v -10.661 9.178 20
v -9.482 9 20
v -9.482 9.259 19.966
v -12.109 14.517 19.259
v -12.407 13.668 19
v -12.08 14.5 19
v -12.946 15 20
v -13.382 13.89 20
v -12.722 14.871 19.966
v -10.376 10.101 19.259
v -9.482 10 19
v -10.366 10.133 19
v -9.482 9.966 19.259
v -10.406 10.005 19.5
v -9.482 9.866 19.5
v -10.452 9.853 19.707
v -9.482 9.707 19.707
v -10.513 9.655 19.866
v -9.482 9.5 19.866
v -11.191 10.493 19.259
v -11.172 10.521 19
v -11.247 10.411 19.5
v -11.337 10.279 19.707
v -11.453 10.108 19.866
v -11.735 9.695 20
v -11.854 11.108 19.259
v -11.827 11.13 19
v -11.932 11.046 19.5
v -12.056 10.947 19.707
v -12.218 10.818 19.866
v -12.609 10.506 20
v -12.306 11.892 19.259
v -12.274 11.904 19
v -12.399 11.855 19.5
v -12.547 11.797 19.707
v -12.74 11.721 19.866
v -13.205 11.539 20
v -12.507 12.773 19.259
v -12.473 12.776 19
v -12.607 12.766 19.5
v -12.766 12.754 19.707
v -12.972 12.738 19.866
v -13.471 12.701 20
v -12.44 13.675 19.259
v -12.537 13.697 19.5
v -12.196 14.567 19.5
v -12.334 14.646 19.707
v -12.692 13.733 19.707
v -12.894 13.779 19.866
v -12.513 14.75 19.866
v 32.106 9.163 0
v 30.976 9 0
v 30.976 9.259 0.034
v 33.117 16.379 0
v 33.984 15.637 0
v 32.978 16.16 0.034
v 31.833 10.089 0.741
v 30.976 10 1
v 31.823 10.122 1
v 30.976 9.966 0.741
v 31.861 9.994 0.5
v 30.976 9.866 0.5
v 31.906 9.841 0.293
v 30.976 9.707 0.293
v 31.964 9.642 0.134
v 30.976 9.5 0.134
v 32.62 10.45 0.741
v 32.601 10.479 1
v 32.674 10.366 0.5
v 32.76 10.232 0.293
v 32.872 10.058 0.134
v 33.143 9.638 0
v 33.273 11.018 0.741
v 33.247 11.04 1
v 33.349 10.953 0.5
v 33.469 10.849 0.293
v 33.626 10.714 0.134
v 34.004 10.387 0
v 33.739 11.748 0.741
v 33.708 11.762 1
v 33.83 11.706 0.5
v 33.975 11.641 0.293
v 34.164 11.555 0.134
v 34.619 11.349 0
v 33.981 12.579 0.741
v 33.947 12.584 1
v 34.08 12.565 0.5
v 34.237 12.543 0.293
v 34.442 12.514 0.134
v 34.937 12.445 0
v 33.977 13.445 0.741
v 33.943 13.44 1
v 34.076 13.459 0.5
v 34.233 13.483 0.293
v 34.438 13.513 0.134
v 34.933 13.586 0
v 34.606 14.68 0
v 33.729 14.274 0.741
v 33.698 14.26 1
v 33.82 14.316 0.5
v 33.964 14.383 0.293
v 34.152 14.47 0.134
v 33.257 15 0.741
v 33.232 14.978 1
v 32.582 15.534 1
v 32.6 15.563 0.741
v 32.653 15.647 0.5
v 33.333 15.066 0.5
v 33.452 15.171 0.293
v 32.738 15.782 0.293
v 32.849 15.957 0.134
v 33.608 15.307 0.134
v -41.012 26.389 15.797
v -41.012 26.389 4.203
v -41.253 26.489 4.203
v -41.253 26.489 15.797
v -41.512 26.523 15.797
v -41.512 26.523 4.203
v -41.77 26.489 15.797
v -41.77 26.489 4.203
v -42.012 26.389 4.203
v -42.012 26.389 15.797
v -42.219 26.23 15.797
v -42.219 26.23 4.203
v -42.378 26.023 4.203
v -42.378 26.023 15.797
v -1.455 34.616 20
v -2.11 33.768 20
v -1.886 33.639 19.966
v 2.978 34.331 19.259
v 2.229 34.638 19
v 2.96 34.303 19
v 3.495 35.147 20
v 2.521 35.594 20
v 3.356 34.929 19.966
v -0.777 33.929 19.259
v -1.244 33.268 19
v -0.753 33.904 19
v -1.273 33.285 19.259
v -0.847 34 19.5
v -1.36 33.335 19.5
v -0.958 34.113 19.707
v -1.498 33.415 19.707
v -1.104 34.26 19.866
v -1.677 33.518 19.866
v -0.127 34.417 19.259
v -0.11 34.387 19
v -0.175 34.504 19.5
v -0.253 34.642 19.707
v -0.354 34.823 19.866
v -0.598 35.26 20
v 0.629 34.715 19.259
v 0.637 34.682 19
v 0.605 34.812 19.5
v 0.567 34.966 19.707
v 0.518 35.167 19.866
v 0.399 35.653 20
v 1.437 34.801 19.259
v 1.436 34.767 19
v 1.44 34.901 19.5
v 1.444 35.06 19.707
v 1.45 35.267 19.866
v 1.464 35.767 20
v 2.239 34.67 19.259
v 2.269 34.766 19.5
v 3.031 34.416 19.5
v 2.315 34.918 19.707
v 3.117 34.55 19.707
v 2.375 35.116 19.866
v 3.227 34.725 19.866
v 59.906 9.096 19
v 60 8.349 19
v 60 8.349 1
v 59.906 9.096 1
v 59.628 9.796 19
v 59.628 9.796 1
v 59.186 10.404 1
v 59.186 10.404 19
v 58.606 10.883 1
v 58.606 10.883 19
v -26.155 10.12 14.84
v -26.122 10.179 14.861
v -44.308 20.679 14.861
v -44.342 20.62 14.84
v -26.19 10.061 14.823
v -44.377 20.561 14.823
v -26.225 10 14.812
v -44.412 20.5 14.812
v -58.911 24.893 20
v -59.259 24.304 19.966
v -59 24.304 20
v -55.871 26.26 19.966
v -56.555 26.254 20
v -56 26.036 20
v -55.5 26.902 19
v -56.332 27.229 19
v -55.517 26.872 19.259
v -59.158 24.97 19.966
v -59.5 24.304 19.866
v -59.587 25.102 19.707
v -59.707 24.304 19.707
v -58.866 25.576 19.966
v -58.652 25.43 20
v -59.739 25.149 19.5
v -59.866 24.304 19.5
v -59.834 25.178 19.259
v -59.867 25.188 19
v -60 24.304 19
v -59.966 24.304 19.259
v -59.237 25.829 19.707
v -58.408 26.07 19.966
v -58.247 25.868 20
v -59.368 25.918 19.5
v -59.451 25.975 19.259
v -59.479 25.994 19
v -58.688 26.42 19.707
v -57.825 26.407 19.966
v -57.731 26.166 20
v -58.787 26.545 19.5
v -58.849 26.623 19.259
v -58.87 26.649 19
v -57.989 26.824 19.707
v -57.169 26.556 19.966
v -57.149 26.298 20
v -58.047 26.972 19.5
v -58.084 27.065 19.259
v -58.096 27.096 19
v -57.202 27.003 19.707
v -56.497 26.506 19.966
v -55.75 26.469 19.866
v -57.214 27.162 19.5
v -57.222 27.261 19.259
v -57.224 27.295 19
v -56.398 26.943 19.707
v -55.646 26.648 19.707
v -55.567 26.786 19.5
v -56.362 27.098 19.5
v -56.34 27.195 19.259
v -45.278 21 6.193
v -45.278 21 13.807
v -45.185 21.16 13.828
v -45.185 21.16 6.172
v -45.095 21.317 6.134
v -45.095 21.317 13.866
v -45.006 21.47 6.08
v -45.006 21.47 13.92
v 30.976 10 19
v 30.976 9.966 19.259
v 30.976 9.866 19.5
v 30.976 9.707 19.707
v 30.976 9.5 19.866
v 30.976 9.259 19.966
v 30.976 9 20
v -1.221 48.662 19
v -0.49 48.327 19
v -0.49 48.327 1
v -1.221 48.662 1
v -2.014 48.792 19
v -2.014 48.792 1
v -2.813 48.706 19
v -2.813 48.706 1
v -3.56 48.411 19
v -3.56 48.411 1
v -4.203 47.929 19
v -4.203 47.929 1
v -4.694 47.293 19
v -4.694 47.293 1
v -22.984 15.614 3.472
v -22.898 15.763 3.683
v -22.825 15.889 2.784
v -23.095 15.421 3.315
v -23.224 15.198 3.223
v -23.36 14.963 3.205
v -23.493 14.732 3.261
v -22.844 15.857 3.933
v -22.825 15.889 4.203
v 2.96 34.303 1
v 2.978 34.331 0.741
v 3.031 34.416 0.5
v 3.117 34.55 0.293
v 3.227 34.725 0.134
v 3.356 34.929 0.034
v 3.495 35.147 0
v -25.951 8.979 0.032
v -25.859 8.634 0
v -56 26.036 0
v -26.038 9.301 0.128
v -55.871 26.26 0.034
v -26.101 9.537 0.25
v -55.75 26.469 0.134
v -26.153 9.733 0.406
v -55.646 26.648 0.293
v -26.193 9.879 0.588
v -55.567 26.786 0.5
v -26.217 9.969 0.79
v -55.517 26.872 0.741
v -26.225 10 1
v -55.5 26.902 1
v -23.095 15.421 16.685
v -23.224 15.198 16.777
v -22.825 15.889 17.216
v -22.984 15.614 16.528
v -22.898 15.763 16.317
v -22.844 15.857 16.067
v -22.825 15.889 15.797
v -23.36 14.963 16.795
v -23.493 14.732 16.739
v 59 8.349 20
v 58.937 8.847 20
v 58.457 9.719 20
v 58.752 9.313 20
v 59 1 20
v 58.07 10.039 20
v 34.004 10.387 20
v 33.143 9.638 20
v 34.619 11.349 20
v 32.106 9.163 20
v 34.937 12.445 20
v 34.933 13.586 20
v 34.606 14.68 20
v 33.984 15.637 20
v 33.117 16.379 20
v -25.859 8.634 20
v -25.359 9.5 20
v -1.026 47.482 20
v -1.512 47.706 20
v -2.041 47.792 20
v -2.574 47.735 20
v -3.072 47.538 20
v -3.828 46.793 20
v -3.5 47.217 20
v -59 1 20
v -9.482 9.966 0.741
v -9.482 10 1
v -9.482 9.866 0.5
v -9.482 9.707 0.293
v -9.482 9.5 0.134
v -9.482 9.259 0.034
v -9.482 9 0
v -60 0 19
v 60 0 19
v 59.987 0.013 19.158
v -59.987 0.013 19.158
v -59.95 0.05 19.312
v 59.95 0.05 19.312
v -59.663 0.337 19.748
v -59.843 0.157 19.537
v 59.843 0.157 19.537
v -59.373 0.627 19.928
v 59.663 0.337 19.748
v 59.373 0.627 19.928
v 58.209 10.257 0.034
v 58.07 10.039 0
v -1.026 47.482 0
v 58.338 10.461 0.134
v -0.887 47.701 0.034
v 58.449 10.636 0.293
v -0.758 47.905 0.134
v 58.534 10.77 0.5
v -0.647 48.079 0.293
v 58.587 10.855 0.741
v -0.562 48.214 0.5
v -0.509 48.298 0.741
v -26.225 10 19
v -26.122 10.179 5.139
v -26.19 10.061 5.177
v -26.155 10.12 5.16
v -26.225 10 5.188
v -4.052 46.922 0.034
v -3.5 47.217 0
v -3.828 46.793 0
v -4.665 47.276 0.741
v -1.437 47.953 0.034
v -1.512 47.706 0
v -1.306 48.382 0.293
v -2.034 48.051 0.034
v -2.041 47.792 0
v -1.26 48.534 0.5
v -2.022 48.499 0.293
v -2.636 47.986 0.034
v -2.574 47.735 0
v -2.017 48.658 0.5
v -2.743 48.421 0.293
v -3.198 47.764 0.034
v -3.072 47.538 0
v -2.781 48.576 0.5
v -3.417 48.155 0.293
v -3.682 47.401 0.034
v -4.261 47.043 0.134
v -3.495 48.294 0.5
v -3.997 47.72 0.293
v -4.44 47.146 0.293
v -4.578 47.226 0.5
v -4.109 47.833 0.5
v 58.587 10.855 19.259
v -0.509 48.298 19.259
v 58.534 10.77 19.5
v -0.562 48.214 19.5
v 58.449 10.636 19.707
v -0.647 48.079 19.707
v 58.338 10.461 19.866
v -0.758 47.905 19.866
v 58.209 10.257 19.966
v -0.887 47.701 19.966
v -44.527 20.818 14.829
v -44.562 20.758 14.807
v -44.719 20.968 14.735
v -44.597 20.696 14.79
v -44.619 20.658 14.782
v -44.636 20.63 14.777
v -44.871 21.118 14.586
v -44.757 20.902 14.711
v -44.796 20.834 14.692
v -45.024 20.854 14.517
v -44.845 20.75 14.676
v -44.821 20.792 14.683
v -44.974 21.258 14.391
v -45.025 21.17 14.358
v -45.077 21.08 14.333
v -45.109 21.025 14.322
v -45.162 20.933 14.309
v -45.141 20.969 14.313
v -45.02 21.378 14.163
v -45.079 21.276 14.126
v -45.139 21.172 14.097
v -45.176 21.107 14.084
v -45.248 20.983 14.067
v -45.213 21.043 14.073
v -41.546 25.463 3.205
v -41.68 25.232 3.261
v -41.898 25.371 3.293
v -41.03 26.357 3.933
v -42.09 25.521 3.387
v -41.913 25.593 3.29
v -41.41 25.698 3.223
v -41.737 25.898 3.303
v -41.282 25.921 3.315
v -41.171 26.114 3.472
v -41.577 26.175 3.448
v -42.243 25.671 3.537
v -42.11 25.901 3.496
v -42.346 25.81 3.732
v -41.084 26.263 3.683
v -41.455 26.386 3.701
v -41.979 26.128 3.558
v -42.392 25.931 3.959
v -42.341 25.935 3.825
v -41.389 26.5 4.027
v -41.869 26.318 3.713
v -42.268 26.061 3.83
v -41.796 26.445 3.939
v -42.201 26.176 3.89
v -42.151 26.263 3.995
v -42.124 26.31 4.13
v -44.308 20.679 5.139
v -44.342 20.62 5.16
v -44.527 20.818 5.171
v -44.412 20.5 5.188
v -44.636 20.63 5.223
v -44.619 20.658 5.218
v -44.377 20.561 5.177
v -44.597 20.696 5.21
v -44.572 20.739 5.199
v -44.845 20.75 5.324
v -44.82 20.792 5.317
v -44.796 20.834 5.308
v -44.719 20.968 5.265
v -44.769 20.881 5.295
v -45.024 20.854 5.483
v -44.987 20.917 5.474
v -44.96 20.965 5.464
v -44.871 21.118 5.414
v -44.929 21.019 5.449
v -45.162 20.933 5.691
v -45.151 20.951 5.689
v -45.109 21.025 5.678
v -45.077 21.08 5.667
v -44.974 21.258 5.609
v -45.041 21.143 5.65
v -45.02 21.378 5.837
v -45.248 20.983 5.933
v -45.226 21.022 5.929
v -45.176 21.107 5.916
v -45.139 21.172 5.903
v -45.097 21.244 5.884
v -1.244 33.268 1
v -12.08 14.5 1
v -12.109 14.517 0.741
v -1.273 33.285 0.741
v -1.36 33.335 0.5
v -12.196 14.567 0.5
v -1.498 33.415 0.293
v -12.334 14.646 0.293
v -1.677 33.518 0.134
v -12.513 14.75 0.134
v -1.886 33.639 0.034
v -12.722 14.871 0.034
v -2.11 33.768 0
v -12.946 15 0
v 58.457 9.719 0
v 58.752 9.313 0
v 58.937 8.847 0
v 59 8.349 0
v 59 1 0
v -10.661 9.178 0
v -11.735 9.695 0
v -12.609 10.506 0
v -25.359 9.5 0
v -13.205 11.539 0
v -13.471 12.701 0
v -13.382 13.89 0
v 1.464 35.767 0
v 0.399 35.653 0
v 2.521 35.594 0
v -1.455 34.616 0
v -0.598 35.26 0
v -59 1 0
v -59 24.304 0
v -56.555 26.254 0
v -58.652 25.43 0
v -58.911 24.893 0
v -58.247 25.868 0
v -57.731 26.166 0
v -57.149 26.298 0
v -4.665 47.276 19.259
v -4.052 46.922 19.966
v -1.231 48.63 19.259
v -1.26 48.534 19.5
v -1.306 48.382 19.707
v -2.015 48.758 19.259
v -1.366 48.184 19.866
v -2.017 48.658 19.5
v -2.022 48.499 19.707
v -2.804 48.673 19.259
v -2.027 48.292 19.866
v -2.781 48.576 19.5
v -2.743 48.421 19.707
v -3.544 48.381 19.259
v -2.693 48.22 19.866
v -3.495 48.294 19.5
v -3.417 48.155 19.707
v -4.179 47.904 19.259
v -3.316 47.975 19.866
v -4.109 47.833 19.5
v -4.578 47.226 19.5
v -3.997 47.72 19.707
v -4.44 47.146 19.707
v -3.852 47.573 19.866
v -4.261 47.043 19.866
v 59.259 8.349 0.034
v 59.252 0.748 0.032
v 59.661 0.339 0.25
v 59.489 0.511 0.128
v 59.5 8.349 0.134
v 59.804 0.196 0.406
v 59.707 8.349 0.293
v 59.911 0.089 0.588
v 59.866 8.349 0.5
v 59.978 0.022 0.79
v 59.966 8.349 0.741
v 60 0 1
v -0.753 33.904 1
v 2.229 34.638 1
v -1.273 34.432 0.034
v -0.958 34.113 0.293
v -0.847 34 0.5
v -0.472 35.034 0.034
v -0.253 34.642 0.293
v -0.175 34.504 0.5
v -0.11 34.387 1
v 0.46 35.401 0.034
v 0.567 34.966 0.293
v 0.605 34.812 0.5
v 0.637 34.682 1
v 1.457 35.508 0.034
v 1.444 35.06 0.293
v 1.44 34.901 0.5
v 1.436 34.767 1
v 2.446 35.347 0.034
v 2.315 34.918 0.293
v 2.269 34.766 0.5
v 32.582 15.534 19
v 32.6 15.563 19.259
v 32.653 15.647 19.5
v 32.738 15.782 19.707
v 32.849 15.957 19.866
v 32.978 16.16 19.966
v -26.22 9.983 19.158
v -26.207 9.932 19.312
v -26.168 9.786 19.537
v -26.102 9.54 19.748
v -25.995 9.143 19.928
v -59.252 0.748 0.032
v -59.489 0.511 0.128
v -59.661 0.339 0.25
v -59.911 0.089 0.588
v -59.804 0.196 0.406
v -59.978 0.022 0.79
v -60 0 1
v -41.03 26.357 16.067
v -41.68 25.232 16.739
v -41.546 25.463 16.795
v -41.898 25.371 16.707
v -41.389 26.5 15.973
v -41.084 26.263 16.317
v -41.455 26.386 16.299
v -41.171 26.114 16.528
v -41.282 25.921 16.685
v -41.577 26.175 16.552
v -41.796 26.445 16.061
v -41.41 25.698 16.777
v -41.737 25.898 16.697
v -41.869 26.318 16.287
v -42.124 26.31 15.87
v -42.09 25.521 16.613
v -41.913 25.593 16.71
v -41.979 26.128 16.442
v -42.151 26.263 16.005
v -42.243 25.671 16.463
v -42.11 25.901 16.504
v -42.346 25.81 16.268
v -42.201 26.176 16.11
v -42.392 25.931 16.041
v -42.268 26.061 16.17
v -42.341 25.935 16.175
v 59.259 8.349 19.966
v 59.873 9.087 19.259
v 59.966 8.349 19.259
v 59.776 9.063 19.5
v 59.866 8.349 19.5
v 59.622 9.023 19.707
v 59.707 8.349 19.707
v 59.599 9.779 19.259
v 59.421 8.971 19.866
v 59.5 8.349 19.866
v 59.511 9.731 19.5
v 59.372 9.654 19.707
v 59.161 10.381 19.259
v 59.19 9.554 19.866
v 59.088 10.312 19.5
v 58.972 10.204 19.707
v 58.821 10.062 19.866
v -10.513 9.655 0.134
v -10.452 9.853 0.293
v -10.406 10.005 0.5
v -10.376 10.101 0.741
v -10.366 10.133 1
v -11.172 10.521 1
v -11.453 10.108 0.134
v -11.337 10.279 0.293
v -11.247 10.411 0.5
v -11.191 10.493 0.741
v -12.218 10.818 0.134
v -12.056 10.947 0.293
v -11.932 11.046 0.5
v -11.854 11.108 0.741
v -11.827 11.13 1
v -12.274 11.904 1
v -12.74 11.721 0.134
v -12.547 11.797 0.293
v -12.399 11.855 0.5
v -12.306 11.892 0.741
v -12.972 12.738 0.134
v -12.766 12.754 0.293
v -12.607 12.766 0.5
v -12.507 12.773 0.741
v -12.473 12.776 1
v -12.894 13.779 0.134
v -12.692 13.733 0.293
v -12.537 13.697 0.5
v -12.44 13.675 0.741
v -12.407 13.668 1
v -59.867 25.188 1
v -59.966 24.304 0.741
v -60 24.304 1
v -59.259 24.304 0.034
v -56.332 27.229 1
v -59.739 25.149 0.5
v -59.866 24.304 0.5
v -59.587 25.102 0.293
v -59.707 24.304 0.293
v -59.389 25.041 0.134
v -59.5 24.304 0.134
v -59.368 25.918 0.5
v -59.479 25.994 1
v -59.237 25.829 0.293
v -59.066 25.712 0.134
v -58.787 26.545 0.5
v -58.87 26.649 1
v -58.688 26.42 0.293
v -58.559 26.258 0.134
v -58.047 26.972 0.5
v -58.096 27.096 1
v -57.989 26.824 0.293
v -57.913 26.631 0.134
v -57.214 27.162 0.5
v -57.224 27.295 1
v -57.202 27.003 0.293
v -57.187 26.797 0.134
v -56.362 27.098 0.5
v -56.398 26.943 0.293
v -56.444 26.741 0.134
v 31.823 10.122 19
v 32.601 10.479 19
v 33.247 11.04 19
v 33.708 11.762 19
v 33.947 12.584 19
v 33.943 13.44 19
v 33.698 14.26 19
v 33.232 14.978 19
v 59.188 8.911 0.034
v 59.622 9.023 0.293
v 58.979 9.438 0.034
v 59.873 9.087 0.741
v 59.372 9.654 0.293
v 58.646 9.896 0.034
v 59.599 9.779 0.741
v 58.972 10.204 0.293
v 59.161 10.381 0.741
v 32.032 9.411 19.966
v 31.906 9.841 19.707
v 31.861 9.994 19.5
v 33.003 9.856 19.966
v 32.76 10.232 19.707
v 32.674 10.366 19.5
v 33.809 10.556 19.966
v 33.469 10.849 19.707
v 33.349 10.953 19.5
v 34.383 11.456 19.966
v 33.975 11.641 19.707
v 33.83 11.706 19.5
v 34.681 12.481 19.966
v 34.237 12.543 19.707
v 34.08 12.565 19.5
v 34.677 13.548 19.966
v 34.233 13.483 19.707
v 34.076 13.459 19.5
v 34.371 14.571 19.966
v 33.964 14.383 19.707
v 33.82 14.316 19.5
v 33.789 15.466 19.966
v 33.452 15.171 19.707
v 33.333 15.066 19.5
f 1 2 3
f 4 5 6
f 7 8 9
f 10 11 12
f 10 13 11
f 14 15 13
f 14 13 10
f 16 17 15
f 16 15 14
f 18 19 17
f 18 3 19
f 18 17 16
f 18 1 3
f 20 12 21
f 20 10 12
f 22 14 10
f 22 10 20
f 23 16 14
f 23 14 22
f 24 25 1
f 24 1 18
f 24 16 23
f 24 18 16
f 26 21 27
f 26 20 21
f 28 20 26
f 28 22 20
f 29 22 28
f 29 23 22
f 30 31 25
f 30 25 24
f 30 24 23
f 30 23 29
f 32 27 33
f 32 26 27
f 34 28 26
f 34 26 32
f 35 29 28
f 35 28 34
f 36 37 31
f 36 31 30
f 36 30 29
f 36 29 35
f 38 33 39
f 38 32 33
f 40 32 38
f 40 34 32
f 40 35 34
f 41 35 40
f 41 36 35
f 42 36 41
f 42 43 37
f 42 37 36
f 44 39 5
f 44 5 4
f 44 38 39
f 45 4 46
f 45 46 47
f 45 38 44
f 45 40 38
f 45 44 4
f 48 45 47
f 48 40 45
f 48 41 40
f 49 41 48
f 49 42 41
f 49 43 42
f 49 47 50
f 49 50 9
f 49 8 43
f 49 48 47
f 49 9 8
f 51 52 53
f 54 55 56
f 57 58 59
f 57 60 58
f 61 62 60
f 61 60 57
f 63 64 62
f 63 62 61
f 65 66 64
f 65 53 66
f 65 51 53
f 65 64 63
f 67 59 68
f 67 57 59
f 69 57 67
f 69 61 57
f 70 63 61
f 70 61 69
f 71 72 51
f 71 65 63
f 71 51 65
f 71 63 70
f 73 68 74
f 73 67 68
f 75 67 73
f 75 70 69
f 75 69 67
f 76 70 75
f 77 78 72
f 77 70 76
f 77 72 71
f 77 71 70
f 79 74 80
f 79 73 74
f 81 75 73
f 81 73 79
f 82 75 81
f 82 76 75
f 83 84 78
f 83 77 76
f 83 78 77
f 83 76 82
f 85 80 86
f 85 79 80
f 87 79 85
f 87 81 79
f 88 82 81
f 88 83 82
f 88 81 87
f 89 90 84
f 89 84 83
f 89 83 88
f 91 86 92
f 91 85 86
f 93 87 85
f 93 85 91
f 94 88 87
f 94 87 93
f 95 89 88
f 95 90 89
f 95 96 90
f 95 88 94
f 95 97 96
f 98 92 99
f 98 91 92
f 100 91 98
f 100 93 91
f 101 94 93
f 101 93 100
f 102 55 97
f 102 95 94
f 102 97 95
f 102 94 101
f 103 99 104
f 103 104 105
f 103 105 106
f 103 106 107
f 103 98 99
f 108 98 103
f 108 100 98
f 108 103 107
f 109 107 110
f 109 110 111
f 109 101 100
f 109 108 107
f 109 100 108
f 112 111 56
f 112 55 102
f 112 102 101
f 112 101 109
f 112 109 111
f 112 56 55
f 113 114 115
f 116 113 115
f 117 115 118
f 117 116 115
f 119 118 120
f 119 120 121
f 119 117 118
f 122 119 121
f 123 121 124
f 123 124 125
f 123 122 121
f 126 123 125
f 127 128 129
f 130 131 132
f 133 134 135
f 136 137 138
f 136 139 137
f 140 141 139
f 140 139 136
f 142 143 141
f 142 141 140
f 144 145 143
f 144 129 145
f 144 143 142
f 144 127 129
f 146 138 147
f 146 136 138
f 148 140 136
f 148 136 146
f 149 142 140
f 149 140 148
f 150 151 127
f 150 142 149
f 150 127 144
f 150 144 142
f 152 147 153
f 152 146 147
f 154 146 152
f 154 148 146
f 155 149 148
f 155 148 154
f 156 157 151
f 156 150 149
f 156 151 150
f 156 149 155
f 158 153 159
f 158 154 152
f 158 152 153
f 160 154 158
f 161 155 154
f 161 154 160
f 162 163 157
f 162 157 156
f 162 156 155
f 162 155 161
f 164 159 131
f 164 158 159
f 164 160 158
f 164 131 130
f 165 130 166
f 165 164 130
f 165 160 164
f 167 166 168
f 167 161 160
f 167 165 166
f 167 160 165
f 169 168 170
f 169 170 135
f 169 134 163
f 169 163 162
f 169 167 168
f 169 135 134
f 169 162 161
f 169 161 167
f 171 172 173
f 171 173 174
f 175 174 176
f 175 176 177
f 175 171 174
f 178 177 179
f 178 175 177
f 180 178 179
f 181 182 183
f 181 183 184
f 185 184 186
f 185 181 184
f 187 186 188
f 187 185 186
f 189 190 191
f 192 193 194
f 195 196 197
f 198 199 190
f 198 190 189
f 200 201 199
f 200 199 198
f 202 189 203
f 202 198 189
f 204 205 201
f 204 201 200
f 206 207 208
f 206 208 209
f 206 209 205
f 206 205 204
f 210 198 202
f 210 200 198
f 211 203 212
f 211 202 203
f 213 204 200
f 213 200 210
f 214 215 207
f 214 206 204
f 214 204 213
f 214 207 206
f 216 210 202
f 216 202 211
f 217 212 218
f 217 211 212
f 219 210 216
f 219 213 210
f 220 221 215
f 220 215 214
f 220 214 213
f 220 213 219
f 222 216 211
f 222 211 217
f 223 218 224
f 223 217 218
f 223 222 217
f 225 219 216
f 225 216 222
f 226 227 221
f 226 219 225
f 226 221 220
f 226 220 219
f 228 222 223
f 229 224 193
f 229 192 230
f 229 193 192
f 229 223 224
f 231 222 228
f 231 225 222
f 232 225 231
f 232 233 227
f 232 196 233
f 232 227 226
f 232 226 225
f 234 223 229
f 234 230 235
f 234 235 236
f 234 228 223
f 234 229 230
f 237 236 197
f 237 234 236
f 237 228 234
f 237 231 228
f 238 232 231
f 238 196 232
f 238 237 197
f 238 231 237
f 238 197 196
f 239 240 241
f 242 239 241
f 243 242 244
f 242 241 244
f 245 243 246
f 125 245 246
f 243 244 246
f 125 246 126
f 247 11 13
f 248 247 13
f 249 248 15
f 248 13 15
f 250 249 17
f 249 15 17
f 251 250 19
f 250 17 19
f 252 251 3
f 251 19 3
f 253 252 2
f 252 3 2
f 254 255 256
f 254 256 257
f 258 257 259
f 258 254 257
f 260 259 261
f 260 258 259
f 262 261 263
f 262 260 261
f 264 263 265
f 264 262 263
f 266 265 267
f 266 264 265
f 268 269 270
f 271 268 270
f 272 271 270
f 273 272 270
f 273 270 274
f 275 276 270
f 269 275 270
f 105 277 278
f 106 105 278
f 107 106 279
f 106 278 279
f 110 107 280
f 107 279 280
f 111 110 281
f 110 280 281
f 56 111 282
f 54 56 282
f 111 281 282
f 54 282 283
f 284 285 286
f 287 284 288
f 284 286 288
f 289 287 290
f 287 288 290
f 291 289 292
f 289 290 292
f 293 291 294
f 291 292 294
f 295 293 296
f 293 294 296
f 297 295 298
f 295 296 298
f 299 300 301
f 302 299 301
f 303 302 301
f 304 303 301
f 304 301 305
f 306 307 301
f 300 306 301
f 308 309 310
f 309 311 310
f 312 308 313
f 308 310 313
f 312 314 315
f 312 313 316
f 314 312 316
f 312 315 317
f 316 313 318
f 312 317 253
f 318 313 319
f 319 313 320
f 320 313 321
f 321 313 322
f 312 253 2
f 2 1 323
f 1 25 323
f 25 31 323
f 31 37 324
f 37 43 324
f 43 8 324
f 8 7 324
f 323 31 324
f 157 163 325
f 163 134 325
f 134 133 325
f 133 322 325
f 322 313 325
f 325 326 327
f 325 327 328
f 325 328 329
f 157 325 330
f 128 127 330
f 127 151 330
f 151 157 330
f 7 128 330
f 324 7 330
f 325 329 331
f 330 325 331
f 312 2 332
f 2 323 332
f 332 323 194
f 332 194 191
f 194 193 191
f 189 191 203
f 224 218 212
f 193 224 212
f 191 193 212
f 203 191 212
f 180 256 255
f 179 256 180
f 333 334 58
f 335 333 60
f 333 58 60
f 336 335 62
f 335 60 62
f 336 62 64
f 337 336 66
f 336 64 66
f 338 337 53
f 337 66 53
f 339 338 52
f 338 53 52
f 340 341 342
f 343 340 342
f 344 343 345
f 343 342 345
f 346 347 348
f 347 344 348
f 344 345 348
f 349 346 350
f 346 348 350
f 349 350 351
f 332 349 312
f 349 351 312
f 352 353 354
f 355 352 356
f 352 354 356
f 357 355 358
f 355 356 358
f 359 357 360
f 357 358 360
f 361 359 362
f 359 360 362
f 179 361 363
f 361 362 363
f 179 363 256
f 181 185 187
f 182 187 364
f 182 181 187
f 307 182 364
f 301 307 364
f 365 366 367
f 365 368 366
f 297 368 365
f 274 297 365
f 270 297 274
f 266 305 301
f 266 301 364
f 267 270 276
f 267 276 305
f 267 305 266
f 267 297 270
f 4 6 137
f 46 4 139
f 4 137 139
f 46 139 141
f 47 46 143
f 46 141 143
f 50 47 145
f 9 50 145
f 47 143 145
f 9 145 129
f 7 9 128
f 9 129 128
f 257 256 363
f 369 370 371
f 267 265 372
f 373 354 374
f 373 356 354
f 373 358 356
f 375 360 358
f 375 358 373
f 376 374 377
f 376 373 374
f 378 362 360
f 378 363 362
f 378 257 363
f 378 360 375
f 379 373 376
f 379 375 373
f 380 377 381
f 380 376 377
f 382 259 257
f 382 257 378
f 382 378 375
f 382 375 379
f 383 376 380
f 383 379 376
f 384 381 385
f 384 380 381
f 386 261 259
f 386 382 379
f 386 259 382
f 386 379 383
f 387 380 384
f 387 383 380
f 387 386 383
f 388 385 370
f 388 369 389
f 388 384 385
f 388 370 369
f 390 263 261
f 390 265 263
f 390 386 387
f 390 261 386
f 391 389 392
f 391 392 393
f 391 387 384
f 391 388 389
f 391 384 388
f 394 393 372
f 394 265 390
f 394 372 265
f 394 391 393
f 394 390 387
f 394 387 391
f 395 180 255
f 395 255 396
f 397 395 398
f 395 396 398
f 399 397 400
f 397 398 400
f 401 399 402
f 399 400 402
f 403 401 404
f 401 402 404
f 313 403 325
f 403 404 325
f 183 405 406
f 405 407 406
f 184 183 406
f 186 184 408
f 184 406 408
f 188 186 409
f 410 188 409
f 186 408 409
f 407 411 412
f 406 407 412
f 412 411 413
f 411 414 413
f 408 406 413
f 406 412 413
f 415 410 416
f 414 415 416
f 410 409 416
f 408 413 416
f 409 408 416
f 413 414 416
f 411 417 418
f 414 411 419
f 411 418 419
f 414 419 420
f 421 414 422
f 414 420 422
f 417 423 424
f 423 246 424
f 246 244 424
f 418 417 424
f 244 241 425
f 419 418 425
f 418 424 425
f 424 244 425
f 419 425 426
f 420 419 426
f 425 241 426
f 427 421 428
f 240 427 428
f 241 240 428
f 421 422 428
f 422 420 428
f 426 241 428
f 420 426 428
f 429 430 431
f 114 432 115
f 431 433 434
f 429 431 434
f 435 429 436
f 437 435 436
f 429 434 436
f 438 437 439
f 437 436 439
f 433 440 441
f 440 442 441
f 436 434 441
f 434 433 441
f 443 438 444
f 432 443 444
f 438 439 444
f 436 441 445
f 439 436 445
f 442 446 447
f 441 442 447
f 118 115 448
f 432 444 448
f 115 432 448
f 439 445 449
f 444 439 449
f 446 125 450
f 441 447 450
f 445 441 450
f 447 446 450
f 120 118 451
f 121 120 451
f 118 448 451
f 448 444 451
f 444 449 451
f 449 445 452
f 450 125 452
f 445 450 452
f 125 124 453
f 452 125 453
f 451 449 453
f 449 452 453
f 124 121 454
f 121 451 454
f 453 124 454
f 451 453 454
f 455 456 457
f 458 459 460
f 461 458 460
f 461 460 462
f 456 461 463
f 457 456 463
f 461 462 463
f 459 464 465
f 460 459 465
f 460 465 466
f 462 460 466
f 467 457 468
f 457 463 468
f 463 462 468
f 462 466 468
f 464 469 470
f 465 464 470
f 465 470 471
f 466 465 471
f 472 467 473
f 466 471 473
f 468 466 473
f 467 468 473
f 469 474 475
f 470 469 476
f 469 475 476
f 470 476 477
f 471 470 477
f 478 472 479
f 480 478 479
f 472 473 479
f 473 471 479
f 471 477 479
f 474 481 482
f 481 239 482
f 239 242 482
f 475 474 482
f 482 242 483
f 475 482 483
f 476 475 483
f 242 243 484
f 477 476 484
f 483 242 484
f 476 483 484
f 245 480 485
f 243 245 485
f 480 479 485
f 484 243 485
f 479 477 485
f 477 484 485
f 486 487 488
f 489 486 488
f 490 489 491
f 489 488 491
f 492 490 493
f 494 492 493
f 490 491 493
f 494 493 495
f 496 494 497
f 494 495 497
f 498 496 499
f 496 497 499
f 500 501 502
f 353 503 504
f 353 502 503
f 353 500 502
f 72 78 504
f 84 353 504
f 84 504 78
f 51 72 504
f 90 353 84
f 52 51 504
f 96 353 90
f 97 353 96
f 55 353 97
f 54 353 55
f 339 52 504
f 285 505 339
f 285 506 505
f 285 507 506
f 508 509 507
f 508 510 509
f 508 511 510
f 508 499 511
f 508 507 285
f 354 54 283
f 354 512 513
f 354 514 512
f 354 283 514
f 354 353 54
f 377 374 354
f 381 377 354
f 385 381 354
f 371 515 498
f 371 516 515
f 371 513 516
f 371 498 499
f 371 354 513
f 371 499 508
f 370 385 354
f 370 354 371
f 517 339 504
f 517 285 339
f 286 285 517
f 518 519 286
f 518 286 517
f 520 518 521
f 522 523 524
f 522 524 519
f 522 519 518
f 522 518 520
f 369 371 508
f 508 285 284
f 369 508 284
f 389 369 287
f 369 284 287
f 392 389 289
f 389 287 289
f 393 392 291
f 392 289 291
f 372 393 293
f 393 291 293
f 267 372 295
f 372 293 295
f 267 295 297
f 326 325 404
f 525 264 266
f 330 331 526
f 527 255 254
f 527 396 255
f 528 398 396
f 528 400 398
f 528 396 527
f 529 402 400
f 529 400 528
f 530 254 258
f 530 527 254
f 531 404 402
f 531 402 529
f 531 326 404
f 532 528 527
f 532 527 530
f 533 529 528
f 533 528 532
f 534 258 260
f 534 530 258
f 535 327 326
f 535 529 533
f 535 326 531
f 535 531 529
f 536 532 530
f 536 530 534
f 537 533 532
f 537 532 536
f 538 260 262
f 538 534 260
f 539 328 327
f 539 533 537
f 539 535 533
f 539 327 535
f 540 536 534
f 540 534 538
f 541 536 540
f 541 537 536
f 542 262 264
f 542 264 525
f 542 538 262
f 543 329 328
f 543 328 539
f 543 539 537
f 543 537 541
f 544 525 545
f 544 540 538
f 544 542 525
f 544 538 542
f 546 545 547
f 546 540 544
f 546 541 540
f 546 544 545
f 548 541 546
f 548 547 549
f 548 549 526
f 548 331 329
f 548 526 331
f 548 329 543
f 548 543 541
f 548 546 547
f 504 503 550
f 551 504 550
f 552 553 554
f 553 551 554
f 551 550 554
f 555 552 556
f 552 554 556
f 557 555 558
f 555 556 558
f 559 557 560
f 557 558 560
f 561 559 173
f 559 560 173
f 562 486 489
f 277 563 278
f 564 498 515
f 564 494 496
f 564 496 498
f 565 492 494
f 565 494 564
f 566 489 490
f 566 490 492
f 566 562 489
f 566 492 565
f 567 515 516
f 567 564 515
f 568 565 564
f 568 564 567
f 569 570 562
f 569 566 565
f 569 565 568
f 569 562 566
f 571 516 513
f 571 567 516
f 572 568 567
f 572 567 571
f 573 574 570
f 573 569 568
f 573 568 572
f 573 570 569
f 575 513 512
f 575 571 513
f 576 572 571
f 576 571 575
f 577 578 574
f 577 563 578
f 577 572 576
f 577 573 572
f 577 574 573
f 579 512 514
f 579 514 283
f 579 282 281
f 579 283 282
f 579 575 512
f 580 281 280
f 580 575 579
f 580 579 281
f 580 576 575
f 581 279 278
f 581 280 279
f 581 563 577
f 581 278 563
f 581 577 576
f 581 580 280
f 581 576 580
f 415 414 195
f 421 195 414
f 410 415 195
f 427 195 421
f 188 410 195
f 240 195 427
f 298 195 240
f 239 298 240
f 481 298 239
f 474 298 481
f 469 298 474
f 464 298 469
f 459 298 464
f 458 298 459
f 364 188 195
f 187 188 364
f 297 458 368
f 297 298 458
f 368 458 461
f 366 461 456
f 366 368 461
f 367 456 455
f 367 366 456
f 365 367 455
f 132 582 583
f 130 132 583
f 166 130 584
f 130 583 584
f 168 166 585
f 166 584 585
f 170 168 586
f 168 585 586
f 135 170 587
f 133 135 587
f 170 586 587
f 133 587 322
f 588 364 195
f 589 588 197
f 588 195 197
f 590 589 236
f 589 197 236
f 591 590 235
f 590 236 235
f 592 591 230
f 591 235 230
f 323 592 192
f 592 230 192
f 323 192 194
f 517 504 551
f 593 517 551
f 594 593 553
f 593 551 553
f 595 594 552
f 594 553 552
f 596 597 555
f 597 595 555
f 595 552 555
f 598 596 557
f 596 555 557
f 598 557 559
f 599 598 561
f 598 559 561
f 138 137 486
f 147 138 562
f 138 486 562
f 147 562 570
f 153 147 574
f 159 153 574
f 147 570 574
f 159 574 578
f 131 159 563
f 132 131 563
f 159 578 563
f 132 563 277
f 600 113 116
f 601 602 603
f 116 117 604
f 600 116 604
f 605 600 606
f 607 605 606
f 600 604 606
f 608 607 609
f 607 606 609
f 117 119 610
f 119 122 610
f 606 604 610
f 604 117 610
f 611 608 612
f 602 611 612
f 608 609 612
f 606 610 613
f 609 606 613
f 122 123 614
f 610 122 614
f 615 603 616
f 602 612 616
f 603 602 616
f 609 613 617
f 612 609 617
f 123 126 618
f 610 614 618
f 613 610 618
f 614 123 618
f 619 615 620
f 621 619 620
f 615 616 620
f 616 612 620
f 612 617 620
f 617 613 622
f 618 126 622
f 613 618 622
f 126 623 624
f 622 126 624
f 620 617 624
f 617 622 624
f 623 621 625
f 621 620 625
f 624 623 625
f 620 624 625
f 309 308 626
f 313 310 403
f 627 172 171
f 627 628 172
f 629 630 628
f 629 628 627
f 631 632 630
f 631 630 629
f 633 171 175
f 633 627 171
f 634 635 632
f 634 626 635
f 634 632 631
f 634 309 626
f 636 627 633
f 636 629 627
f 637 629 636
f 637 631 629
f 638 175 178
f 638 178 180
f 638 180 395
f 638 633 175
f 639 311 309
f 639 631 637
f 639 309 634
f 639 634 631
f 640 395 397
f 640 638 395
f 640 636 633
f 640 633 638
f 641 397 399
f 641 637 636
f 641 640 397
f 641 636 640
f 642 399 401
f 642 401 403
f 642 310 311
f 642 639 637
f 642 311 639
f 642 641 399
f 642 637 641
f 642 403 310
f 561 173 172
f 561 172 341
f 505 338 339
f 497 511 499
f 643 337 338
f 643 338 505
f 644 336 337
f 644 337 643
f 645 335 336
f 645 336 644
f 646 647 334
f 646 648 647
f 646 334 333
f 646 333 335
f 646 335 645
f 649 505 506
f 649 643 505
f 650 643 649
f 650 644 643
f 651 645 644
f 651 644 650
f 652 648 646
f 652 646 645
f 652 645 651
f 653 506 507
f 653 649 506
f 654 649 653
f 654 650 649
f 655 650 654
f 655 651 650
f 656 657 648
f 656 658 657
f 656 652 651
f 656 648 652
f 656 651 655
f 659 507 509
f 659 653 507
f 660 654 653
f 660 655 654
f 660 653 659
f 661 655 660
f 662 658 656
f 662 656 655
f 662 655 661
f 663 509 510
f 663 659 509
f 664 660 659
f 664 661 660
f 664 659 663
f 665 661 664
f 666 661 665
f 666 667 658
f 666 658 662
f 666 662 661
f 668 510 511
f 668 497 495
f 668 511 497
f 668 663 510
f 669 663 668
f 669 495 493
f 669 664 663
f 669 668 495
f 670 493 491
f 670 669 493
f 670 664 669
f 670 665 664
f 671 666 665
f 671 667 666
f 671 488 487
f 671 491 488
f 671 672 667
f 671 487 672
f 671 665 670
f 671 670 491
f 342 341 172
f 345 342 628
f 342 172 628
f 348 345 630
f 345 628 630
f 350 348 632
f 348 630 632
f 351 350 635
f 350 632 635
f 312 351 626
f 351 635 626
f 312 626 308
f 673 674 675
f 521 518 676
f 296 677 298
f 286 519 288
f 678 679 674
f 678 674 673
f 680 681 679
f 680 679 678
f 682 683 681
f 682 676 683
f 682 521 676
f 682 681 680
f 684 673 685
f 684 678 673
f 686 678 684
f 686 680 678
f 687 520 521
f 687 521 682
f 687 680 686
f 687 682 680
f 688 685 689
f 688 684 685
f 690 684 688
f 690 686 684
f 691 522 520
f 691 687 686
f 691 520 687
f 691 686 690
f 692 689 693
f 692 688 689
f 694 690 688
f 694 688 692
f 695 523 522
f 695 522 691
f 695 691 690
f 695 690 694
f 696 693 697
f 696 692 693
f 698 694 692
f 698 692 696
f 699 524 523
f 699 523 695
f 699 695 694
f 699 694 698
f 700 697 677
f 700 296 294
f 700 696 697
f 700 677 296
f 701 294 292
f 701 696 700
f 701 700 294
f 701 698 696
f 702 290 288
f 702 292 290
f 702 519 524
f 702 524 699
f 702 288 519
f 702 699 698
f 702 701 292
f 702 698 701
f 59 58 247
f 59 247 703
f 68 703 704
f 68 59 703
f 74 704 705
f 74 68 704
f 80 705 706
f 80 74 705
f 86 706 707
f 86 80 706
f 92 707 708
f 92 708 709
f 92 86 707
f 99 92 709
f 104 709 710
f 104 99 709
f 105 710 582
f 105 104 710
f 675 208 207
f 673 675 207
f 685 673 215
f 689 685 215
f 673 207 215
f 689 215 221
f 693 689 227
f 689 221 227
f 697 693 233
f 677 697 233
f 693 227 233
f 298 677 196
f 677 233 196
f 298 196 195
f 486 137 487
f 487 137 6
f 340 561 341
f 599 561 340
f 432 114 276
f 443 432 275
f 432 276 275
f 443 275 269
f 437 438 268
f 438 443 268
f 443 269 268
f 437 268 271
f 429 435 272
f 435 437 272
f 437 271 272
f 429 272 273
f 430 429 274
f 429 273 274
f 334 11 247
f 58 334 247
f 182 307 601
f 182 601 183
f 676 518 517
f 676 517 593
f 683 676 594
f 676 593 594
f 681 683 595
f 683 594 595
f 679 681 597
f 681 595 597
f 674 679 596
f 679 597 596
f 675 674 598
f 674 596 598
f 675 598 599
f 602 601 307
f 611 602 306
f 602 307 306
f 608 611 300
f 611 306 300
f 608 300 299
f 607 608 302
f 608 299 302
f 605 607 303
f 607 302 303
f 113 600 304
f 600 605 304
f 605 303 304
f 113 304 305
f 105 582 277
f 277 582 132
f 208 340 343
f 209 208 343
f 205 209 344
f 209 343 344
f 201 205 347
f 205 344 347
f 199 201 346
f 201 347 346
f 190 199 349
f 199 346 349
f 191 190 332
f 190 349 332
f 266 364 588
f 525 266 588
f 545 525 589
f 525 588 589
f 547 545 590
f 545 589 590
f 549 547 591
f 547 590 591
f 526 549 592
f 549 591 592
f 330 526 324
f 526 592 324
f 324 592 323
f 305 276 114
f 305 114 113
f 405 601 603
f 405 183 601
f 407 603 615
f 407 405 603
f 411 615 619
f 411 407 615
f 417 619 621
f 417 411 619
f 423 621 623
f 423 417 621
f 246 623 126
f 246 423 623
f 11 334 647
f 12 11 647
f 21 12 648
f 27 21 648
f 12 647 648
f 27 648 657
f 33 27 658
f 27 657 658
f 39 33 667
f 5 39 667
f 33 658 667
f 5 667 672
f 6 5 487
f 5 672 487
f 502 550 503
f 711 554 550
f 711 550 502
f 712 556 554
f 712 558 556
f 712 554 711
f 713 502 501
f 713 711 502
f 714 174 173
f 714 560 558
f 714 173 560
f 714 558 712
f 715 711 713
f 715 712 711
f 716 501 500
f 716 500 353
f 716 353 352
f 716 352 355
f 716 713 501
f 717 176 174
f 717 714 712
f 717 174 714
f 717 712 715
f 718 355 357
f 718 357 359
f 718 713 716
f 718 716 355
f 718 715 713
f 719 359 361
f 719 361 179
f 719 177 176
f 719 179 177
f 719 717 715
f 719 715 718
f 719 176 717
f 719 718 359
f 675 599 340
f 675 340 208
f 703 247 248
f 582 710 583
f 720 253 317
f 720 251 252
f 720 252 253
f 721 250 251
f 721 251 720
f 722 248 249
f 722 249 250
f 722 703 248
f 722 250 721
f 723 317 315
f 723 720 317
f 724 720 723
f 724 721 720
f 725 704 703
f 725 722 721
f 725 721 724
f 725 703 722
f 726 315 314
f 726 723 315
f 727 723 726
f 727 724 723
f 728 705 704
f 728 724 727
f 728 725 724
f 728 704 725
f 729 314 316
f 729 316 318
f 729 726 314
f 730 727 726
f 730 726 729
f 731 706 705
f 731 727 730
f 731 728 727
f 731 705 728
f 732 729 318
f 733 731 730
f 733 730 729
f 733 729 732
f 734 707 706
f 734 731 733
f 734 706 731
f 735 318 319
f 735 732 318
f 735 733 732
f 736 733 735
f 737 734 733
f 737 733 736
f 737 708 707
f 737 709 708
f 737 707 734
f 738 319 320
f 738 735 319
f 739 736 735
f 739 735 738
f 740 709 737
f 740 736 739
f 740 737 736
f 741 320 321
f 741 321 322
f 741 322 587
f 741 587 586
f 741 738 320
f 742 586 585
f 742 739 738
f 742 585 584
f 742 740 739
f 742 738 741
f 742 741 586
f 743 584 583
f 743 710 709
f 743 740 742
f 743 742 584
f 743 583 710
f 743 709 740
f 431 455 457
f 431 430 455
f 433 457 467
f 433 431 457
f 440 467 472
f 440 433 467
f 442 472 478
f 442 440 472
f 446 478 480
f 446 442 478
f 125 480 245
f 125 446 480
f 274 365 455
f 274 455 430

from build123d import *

# Parameters (mm, degrees)
RESSALTO_EXTRUS_O1_DEPTH = 20
RESSALTO_EXTRUS_O2_DEPTH = 22
CORTE_EXTRUS_O1_DEPTH    = 81.622577483
FILETE1_R                = 3
FILETE2_R                = 1
FILETE4_R                = 1


with BuildPart() as part:
    # Esboço1 → Ressalto-extrusão1 (new body)
    with BuildSketch(Plane.XY):
        Polygon((60, 0), (-60, 0), (-60, 29.5), (-26.225009252, 10), (-3.130998485, 50), (60, 10), align=None)
    extrude(amount=RESSALTO_EXTRUS_O1_DEPTH)

    # Esboço2 → Ressalto-extrusão2 (add)
    with BuildSketch(Plane(origin=(-23.998883958, 13.855762114, 0), x_dir=(0, 0, 1), z_dir=(-0.8660254037844418, 0.49999999999999484, 0))):
        Polygon((5.188348382, -4.384983309), (2.783800982, 2.347749412), (17.216199018, 2.347749412), (14.811651618, -4.384983309), (14.811651618, -4.452250588), (5.188348382, -4.452250588), align=None)
    extrude(amount=RESSALTO_EXTRUS_O2_DEPTH)

    # Esboço3 → Corte-extrusão1 (cut, through all)
    with BuildSketch(Plane.XY.offset(20)):
        Polygon((-14.678003869, 10), (41.315910897, 10), (0.319084351, 35.975718762), align=None)
    extrude(amount=-CORTE_EXTRUS_O1_DEPTH, mode=Mode.SUBTRACT)

    # Filete1
    filete1_edges = [part.edges().sort_by_distance(p)[0] for p in [
        (-60, 29.5, 10),
        (-3.130998485, 50, 10),
        (60, 10, 10),
        (-14.678003869, 10, 10),
        (0.319084351, 35.975718762, 10),
        (41.315910897, 10, 10),
    ]]
    fillet(filete1_edges, radius=FILETE1_R)

    # Filete2
    # the kernel refuses this fillet: 1 mm, written as the material it adds along each edge
    with BuildSketch(Plane(origin=(-25.870593694, 9.873051646, 5.188348382), x_dir=(-0.4999999999999947, -0.8660254037844417, -8.936278675324251e-11), z_dir=(-0.8660254037844417, 0.4999999999999947, 0))) as filete2_piece_1:
        with BuildLine():
            CenterArc((0.196805258, -0.991574461), FILETE2_R, 97.442894705, 12.210929358)
            Line((-0.139531139, -0.04983255), (0, 0))
            Line((0, 0), (0.067267279, 0))
        make_face()
    extrude(amount=22.370407054)
    with BuildSketch(Plane(origin=(-25.870593694, 9.873051646, 14.811651618), x_dir=(-0.4999999999999947, -0.8660254037844417, 8.941560163903726e-11), z_dir=(-0.8660254037844417, 0.4999999999999947, 0))) as filete2_piece_2:
        with BuildLine():
            CenterArc((0.196805258, 0.991574461), FILETE2_R, 250.346175937, 12.210929358)
            Line((-0.139531139, 0.04983255), (0, 0))
            Line((0, 0), (0.067267279, 0))
        make_face()
    extrude(amount=22.370407054)
    # the kernel refuses this fillet: 1 mm, written as the material it takes off along each edge
    with BuildSketch(Plane(origin=(-26.225009252, 10, 20), x_dir=(0.8660254037844417, -0.49999999999999484, 0), z_dir=(0.49999999999999484, 0.8660254037844417, 0))) as filete2_2_piece_1:
        with BuildLine():
            CenterArc((FILETE2_R, FILETE2_R), FILETE2_R, 180, 90)
            Line((0, FILETE2_R), (0, 0))
            Line((0, 0), (FILETE2_R, 0))
        make_face()
    extrude(amount=43.061918814, mode=Mode.SUBTRACT)
    with BuildSketch(Plane(origin=(-2.095973634, 45.792715629, 20), x_dir=(0.5352147458149246, 0.8447160326774114, 0), z_dir=(0.8447160326774114, -0.5352147458149246, 0))) as filete2_2_piece_2:
        with BuildLine():
            CenterArc((3 - FILETE2_R, -FILETE2_R), FILETE2_R, 0, 90)
            Line((3, -FILETE2_R), (3, 0))
            Line((3, 0), (3 - FILETE2_R, 0))
        make_face()
    revolve(axis=Axis((-2.095973634, 45.792715629, 20), (0, 0, 1)), revolution_arc=92.358476116, mode=Mode.SUBTRACT)
    with BuildSketch(Plane(origin=(-0.490329397, 48.326863727, 20), x_dir=(-0.5352147458149248, -0.8447160326774114, 0), z_dir=(0.8447160326774115, -0.5352147458149248, 0))) as filete2_2_piece_3:
        with BuildLine():
            CenterArc((FILETE2_R, FILETE2_R), FILETE2_R, 180, 90)
            Line((0, FILETE2_R), (0, 0))
            Line((0, 0), (FILETE2_R, 0))
        make_face()
    extrude(amount=69.959573807, mode=Mode.SUBTRACT)
    with BuildSketch(Plane(origin=(57, 8.349320116, 20), x_dir=(1, 0, 0), z_dir=(0, -1, 0))) as filete2_2_piece_4:
        with BuildLine():
            CenterArc((3 - FILETE2_R, -FILETE2_R), FILETE2_R, 0, 90)
            Line((3 - FILETE2_R, 0), (3, 0))
            Line((3, 0), (3, -FILETE2_R))
        make_face()
    revolve(axis=Axis((57, 8.349320116, 20), (0, 0, 1)), revolution_arc=57.641523884, mode=Mode.SUBTRACT)
    with BuildSketch(Plane(origin=(60, 8.349320116, 20), x_dir=(0, 0, -1), z_dir=(0, -1, 0))) as filete2_2_piece_5:
        with BuildLine():
            CenterArc((FILETE2_R, -FILETE2_R), FILETE2_R, 90, 90)
            Line((0, -FILETE2_R), (0, 0))
            Line((0, 0), (FILETE2_R, 0))
        make_face()
    extrude(amount=10.849320116, mode=Mode.SUBTRACT)
    with BuildSketch(Plane(origin=(62.5, 0, 20), x_dir=(0, 0, -1), z_dir=(-1, 0, 0)), Plane(origin=(62.5, 0, 0), x_dir=(0, 1, 0), z_dir=(-1, 0, 0))) as filete2_2_piece_6:
        with BuildLine():
            CenterArc((FILETE2_R, -FILETE2_R), FILETE2_R, 90, 90)
            Line((0, -FILETE2_R), (0, 0))
            Line((0, 0), (FILETE2_R, 0))
        make_face()
    extrude(amount=125, mode=Mode.SUBTRACT)
    with BuildSketch(Plane(origin=(-60, -2.5, 20), x_dir=(1, 0, 0), z_dir=(0, 1, 0))) as filete2_2_piece_7:
        with BuildLine():
            CenterArc((FILETE2_R, FILETE2_R), FILETE2_R, 180, 90)
            Line((0, FILETE2_R), (0, 0))
            Line((0, 0), (FILETE2_R, 0))
        make_face()
    extrude(amount=26.803847577, mode=Mode.SUBTRACT)
    with BuildSketch(Plane(origin=(-57, 24.303847577, 20), x_dir=(-1, 0, 0), z_dir=(0, -1, 0))) as filete2_2_piece_8:
        with BuildLine():
            CenterArc((3 - FILETE2_R, FILETE2_R), FILETE2_R, 270, 90)
            Line((3, FILETE2_R), (3, 0))
            Line((3, 0), (3 - FILETE2_R, 0))
        make_face()
    revolve(axis=Axis((-57, 24.303847577, 20), (0, 0, -1)), revolution_arc=120, mode=Mode.SUBTRACT)
    with BuildSketch(Plane(origin=(-55.5, 26.901923789, 20), x_dir=(-0.499999999999995, -0.8660254037844416, 0), z_dir=(0.8660254037844416, -0.499999999999995, 0))) as filete2_2_piece_9:
        with BuildLine():
            CenterArc((FILETE2_R, FILETE2_R), FILETE2_R, 180, 90)
            Line((0, FILETE2_R), (0, 0))
            Line((0, 0), (FILETE2_R, 0))
        make_face()
    extrude(amount=33.803847577, mode=Mode.SUBTRACT)
    with BuildSketch(Plane(origin=(-9.481851446, 13, 20), x_dir=(0, -1, 0), z_dir=(1, 0, 0))) as filete2_2_piece_10:
        with BuildLine():
            CenterArc((3 + FILETE2_R, FILETE2_R), FILETE2_R, 180, 90)
            Line((3, FILETE2_R), (3, 0))
            Line((3, 0), (3 + FILETE2_R, 0))
        make_face()
    revolve(axis=Axis((-9.481851446, 13, 20), (0, 0, -1)), revolution_arc=120, mode=Mode.SUBTRACT)
    with BuildSketch(Plane(origin=(-9.481851446, 10, 20), x_dir=(0, -1, 0), z_dir=(1, 0, 0)), Plane(origin=(30.97585928, 10, 0), x_dir=(0, -1, 0), z_dir=(-1, 0, 0))) as filete2_2_piece_11:
        with BuildLine():
            CenterArc((FILETE2_R, FILETE2_R), FILETE2_R, 180, 90)
            Line((0, FILETE2_R), (0, 0))
            Line((0, 0), (FILETE2_R, 0))
        make_face()
    extrude(amount=40.457710726, mode=Mode.SUBTRACT)
    with BuildSketch(Plane(origin=(30.97585928, 13, 20), x_dir=(0, -1, 0), z_dir=(-1, 0, 0))) as filete2_2_piece_12:
        with BuildLine():
            CenterArc((3 + FILETE2_R, -FILETE2_R), FILETE2_R, 90, 90)
            Line((3, -FILETE2_R), (3, 0))
            Line((3, 0), (3 + FILETE2_R, 0))
        make_face()
    revolve(axis=Axis((30.97585928, 13, 20), (0, 0, 1)), revolution_arc=147.641523884, mode=Mode.SUBTRACT)
    with BuildSketch(Plane(origin=(32.581503517, 15.534148098, 20), x_dir=(0.5352147458149246, 0.8447160326774116, 0), z_dir=(-0.8447160326774116, 0.5352147458149246, 0)), Plane(origin=(2.95975344, 34.302582489, 0), x_dir=(0.5352147458149246, 0.8447160326774116, 1.7763568394002497e-15), z_dir=(0.8447160326774116, -0.5352147458149246, 0))) as filete2_2_piece_13:
        with BuildLine():
            CenterArc((FILETE2_R, FILETE2_R), FILETE2_R, 180, 90)
            Line((0, FILETE2_R), (0, 0))
            Line((0, 0), (FILETE2_R, 0))
        make_face()
    extrude(amount=35.067110049, mode=Mode.SUBTRACT)
    with BuildSketch(Plane(origin=(1.354109202, 31.768434391, 20), x_dir=(-0.8660254037844415, 0.49999999999999517, 0), z_dir=(-0.49999999999999517, -0.8660254037844415, 0))) as filete2_2_piece_14:
        with BuildLine():
            CenterArc((3 + FILETE2_R, FILETE2_R), FILETE2_R, 180, 90)
            Line((3, FILETE2_R), (3, 0))
            Line((3, 0), (3 + FILETE2_R, 0))
        make_face()
    revolve(axis=Axis((1.354109202, 31.768434391, 20), (0, 0, -1)), revolution_arc=92.358476116, mode=Mode.SUBTRACT)
    with BuildSketch(Plane(origin=(-1.243967009, 33.268434391, 20), x_dir=(-0.8660254037844417, 0.4999999999999949, 0), z_dir=(-0.4999999999999949, -0.8660254037844417, 0)), Plane(origin=(-12.079927657, 14.5, 0), x_dir=(-0.8660254037844417, 0.4999999999999949, 0), z_dir=(0.4999999999999949, 0.8660254037844417, 0))) as filete2_2_piece_15:
        with BuildLine():
            CenterArc((FILETE2_R, FILETE2_R), FILETE2_R, 180, 90)
            Line((0, FILETE2_R), (0, 0))
            Line((0, 0), (FILETE2_R, 0))
        make_face()
    extrude(amount=21.671921296, mode=Mode.SUBTRACT)
    with BuildSketch(Plane(origin=(60, 8.349320116, 0), x_dir=(0, 0, 1), z_dir=(0, -1, 0))) as filete2_2_piece_16:
        with BuildLine():
            CenterArc((FILETE2_R, FILETE2_R), FILETE2_R, 180, 90)
            Line((0, FILETE2_R), (0, 0))
            Line((0, 0), (FILETE2_R, 0))
        make_face()
    extrude(amount=10.849320116, mode=Mode.SUBTRACT)
    with BuildSketch(Plane(origin=(57, 8.349320116, 0), x_dir=(1, 0, 0), z_dir=(0, -1, 0))) as filete2_2_piece_17:
        with BuildLine():
            CenterArc((3 - FILETE2_R, FILETE2_R), FILETE2_R, 270, 90)
            Line((3, FILETE2_R), (3, 0))
            Line((3, 0), (3 - FILETE2_R, 0))
        make_face()
    revolve(axis=Axis((57, 8.349320116, 0), (0, 0, 1)), revolution_arc=57.641523884, mode=Mode.SUBTRACT)
    with BuildSketch(Plane(origin=(-0.490329397, 48.326863727, 0), x_dir=(-0.5352147458149248, -0.8447160326774114, 0), z_dir=(0.8447160326774115, -0.5352147458149248, 0))) as filete2_2_piece_18:
        with BuildLine():
            CenterArc((FILETE2_R, -FILETE2_R), FILETE2_R, 90, 90)
            Line((0, -FILETE2_R), (0, 0))
            Line((0, 0), (FILETE2_R, 0))
        make_face()
    extrude(amount=69.959573807, mode=Mode.SUBTRACT)
    with BuildSketch(Plane(origin=(-2.095973634, 45.792715629, 0), x_dir=(0.5352147458149246, 0.8447160326774114, 0), z_dir=(0.8447160326774114, -0.5352147458149246, 0))) as filete2_2_piece_19:
        with BuildLine():
            CenterArc((3 - FILETE2_R, FILETE2_R), FILETE2_R, 270, 90)
            Line((3, FILETE2_R), (3, 0))
            Line((3, 0), (3 - FILETE2_R, 0))
        make_face()
    revolve(axis=Axis((-2.095973634, 45.792715629, 0), (0, 0, 1)), revolution_arc=92.358476116, mode=Mode.SUBTRACT)
    with BuildSketch(Plane(origin=(-26.225009252, 10, 0), x_dir=(0.8660254037844417, -0.49999999999999484, 0), z_dir=(0.49999999999999484, 0.8660254037844417, 0))) as filete2_2_piece_20:
        with BuildLine():
            CenterArc((FILETE2_R, -FILETE2_R), FILETE2_R, 90, 90)
            Line((0, -FILETE2_R), (0, 0))
            Line((0, 0), (FILETE2_R, 0))
        make_face()
    extrude(amount=43.061918814, mode=Mode.SUBTRACT)
    with BuildSketch(Plane(origin=(-55.5, 26.901923789, 0), x_dir=(-0.499999999999995, -0.8660254037844416, 0), z_dir=(0.8660254037844416, -0.499999999999995, 0))) as filete2_2_piece_21:
        with BuildLine():
            CenterArc((FILETE2_R, -FILETE2_R), FILETE2_R, 90, 90)
            Line((0, -FILETE2_R), (0, 0))
            Line((0, 0), (FILETE2_R, 0))
        make_face()
    extrude(amount=33.803847577, mode=Mode.SUBTRACT)
    with BuildSketch(Plane(origin=(-57, 24.303847577, 0), x_dir=(-1, 0, 0), z_dir=(0, -1, 0))) as filete2_2_piece_22:
        with BuildLine():
            CenterArc((3 - FILETE2_R, -FILETE2_R), FILETE2_R, 0, 90)
            Line((3, -FILETE2_R), (3, 0))
            Line((3, 0), (3 - FILETE2_R, 0))
        make_face()
    revolve(axis=Axis((-57, 24.303847577, 0), (0, 0, -1)), revolution_arc=120, mode=Mode.SUBTRACT)
    with BuildSketch(Plane(origin=(-60, -2.5, 0), x_dir=(1, 0, 0), z_dir=(0, 1, 0))) as filete2_2_piece_23:
        with BuildLine():
            CenterArc((FILETE2_R, -FILETE2_R), FILETE2_R, 90, 90)
            Line((0, -FILETE2_R), (0, 0))
            Line((0, 0), (FILETE2_R, 0))
        make_face()
    extrude(amount=26.803847577, mode=Mode.SUBTRACT)
    with BuildSketch(Plane(origin=(-9.481851446, 13, 0), x_dir=(0, -1, 0), z_dir=(1, 0, 0))) as filete2_2_piece_24:
        with BuildLine():
            CenterArc((3 + FILETE2_R, -FILETE2_R), FILETE2_R, 90, 90)
            Line((3, -FILETE2_R), (3, 0))
            Line((3, 0), (3 + FILETE2_R, 0))
        make_face()
    revolve(axis=Axis((-9.481851446, 13, 0), (0, 0, -1)), revolution_arc=120, mode=Mode.SUBTRACT)
    with BuildSketch(Plane(origin=(1.354109202, 31.768434391, 0), x_dir=(-0.8660254037844415, 0.49999999999999517, 0), z_dir=(-0.49999999999999517, -0.8660254037844415, 0))) as filete2_2_piece_25:
        with BuildLine():
            CenterArc((3 + FILETE2_R, -FILETE2_R), FILETE2_R, 90, 90)
            Line((3, -FILETE2_R), (3, 0))
            Line((3, 0), (3 + FILETE2_R, 0))
        make_face()
    revolve(axis=Axis((1.354109202, 31.768434391, 0), (0, 0, -1)), revolution_arc=92.358476116, mode=Mode.SUBTRACT)
    with BuildSketch(Plane(origin=(30.97585928, 13, 0), x_dir=(0, -1, 0), z_dir=(-1, 0, 0))) as filete2_2_piece_26:
        with BuildLine():
            CenterArc((3 + FILETE2_R, FILETE2_R), FILETE2_R, 180, 90)
            Line((3, FILETE2_R), (3, 0))
            Line((3, 0), (3 + FILETE2_R, 0))
        make_face()
    revolve(axis=Axis((30.97585928, 13, 0), (0, 0, 1)), revolution_arc=147.641523884, mode=Mode.SUBTRACT)
    with BuildSketch(Plane(origin=(-22.825009252, 15.888972746, 2.783800982), x_dir=(0, 0, 1), z_dir=(-0.8660254037844417, 0.4999999999999947, 0)), Plane(origin=(-22.825009252, 15.888972746, 17.216199018), x_dir=(-0.4708709557974139, -0.8155724192496512, -0.33633639699815604), z_dir=(-0.8660254037844417, 0.4999999999999947, 0))) as filete2_2_piece_27:
        with BuildLine():
            CenterArc((FILETE2_R * 1.41900491052, -FILETE2_R), FILETE2_R, 90, 109.653824058)
            Line((FILETE2_R * 0.477262998928, -FILETE2_R * 1.336336397), (0, 0))
            Line((0, 0), (FILETE2_R * 1.41900491052, 0))
        make_face()
    extrude(amount=25.547512276, mode=Mode.SUBTRACT)
    with BuildSketch(Plane(origin=(-27.475009252, 7.834936491, 20), x_dir=(0.8660254037844417, -0.4999999999999948, 0), z_dir=(0.49999999999999484, 0.8660254037844417, 0))) as filete2_2_piece_28a_section:
        with BuildLine():
            CenterArc((FILETE2_R, FILETE2_R), FILETE2_R, 180, 90)
            Line((0, FILETE2_R), (0, 0))
            Line((0, 0), (FILETE2_R, 0))
        make_face()
    filete2_2_piece_28a = extrude(amount=45.561918814, mode=Mode.PRIVATE)
    filete2_2_piece_28a = split(filete2_2_piece_28a, bisect_by=Plane(origin=(-26.225009252, 10, 20), z_dir=(-0.499999999999995, -0.8660254037844416, 0)), keep=Keep.TOP, mode=Mode.PRIVATE)
    with BuildSketch(Plane(origin=(-55.5, 26.901923789, 20), x_dir=(-0.499999999999995, -0.8660254037844416, 0), z_dir=(0.8660254037844416, -0.499999999999995, 0))) as filete2_2_piece_28b_section:
        with BuildLine():
            CenterArc((FILETE2_R, FILETE2_R), FILETE2_R, 180, 90)
            Line((0, FILETE2_R), (0, 0))
            Line((0, 0), (FILETE2_R, 0))
        make_face()
    filete2_2_piece_28b = extrude(amount=36.303847577, mode=Mode.PRIVATE)
    filete2_2_piece_28b = split(filete2_2_piece_28b, bisect_by=Plane(origin=(-26.225009252, 10, 20), z_dir=(0.8660254037844417, -0.49999999999999484, 0)), keep=Keep.TOP, mode=Mode.PRIVATE)
    filete2_2_piece_28 = filete2_2_piece_28a & filete2_2_piece_28b
    add(filete2_2_piece_28, mode=Mode.SUBTRACT)
    with BuildSketch(Plane(origin=(-27.475009252, 7.834936491, 0), x_dir=(0.8660254037844417, -0.4999999999999948, 0), z_dir=(0.49999999999999484, 0.8660254037844417, 0))) as filete2_2_piece_29a_section:
        with BuildLine():
            CenterArc((FILETE2_R, -FILETE2_R), FILETE2_R, 90, 90)
            Line((0, -FILETE2_R), (0, 0))
            Line((0, 0), (FILETE2_R, 0))
        make_face()
    filete2_2_piece_29a = extrude(amount=45.561918814, mode=Mode.PRIVATE)
    filete2_2_piece_29a = split(filete2_2_piece_29a, bisect_by=Plane(origin=(-26.225009252, 10, 0), z_dir=(-0.499999999999995, -0.8660254037844416, 0)), keep=Keep.TOP, mode=Mode.PRIVATE)
    with BuildSketch(Plane(origin=(-55.5, 26.901923789, 0), x_dir=(-0.499999999999995, -0.8660254037844416, 0), z_dir=(0.8660254037844416, -0.499999999999995, 0))) as filete2_2_piece_29b_section:
        with BuildLine():
            CenterArc((FILETE2_R, -FILETE2_R), FILETE2_R, 90, 90)
            Line((0, -FILETE2_R), (0, 0))
            Line((0, 0), (FILETE2_R, 0))
        make_face()
    filete2_2_piece_29b = extrude(amount=36.303847577, mode=Mode.PRIVATE)
    filete2_2_piece_29b = split(filete2_2_piece_29b, bisect_by=Plane(origin=(-26.225009252, 10, 0), z_dir=(0.8660254037844417, -0.49999999999999484, 0)), keep=Keep.TOP, mode=Mode.PRIVATE)
    filete2_2_piece_29 = filete2_2_piece_29a & filete2_2_piece_29b
    add(filete2_2_piece_29, mode=Mode.SUBTRACT)

    # Filete4
    filete4_edges = [part.edges().sort_by_distance(p)[0] for p in [
        (-43.85995263, 23.455382081, 4.199789907),
        (-43.85995263, 23.455382081, 15.800210093),
        (-41.877568136, 26.888972746, 10),
        (-42.089543917, 26.521819922, 16.614609668),
        (-42.089543917, 26.521819922, 3.385390332),
        (-45.22520413, 21.090697119, 5.16894646),
        (-45.22520413, 21.090697119, 14.83105354),
    ]]
    fillet(filete4_edges, radius=FILETE4_R)


solid = part.part
